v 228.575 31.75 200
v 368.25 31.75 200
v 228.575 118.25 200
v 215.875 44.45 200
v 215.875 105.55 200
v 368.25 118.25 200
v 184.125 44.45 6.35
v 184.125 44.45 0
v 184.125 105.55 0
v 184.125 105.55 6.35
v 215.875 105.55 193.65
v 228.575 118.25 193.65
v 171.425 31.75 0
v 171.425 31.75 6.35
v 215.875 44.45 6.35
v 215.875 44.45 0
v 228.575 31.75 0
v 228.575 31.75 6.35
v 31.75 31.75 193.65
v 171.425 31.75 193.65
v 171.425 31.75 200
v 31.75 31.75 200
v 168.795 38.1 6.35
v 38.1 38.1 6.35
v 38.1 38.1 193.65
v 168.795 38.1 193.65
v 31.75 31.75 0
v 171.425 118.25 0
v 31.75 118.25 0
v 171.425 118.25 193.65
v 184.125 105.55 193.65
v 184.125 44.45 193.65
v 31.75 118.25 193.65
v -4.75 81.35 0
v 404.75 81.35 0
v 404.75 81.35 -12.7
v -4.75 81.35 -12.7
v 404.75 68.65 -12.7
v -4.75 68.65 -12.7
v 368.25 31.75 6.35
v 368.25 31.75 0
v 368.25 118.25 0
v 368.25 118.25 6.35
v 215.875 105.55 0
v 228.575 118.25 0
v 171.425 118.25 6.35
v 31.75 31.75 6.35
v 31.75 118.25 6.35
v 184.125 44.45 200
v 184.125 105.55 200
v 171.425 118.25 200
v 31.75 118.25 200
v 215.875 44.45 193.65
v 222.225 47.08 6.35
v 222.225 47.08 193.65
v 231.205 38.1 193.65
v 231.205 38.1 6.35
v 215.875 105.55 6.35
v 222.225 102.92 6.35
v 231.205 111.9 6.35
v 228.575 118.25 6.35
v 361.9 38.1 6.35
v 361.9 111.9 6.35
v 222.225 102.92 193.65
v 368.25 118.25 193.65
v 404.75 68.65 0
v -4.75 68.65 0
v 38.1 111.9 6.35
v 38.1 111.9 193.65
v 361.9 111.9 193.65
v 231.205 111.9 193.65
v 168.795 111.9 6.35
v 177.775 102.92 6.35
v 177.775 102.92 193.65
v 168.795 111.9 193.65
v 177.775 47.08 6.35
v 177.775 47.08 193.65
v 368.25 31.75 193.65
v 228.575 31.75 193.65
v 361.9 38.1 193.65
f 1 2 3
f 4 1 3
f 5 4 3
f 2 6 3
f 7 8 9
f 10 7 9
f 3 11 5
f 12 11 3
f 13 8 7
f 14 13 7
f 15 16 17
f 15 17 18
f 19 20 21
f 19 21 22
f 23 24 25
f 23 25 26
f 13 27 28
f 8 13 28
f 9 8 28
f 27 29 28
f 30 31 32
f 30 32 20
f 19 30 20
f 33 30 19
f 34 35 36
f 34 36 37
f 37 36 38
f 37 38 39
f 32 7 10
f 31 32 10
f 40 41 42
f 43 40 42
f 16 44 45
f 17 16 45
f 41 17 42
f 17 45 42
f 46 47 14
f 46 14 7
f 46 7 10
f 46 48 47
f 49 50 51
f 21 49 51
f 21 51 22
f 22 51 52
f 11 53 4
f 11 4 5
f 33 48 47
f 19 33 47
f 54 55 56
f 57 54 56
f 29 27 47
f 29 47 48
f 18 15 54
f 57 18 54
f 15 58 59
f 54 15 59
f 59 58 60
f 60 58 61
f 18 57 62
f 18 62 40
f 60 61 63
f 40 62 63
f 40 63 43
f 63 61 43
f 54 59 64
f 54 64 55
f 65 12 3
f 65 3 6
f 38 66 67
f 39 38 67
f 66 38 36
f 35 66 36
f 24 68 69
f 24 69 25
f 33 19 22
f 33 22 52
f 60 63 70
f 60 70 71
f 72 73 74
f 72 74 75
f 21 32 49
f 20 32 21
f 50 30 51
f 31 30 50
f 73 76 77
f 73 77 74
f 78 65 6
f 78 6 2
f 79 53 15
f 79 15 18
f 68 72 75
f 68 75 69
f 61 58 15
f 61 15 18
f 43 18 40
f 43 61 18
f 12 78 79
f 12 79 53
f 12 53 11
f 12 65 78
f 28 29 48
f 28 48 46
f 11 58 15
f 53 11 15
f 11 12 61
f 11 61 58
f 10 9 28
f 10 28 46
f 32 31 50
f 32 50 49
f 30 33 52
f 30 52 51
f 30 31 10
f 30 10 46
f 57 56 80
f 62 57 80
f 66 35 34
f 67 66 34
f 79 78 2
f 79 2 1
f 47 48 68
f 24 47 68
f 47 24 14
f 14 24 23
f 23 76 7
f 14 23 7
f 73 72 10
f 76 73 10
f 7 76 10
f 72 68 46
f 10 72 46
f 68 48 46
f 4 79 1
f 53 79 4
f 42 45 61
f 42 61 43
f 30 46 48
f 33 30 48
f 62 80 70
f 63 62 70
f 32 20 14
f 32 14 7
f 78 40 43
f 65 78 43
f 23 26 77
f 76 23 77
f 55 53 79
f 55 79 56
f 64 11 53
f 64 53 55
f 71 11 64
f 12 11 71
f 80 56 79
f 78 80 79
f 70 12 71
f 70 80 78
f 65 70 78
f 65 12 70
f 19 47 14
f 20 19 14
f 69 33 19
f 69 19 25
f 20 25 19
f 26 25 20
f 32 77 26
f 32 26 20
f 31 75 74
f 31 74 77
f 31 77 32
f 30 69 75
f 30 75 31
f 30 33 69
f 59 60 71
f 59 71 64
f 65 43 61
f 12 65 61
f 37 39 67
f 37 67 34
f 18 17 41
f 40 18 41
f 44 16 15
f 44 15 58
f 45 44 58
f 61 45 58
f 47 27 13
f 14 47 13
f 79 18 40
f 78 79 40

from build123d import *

# Parameters (mm, degrees)
CROQUIS1_W                = 152.375
CROQUIS1_H                = 86.5
SALIENTE_EXTRUIR1_DEPTH   = 6.35
SALIENTE_EXTRUIR1_2_DEPTH = 6.35
CHAFL_N1_SIZE             = 12.7
CHAFL_N2_SIZE             = 12.7
SALIENTE_EXTRUIR2_DEPTH   = 187.3
SALIENTE_EXTRUIR2_2_DEPTH = 187.3
SALIENTE_EXTRUIR3_DEPTH   = 6.35
SALIENTE_EXTRUIR3_2_DEPTH = 6.35
CROQUIS4_W                = 409.5
CROQUIS4_H                = 12.7
SALIENTE_EXTRUIR4_DEPTH   = 12.7


with BuildPart() as part:
    # Croquis1 → Saliente-Extruir1 (new body)
    with BuildSketch(Plane.XY):
        with Locations((107.9375, 75)):
            Rectangle(CROQUIS1_W, CROQUIS1_H)
    extrude(amount=SALIENTE_EXTRUIR1_DEPTH)

    # Chaflán1
    chafl_n1_edges = [part.edges().sort_by_distance(p)[0] for p in [
        (184.125, 118.25, 3.175),
        (184.125, 31.75, 3.175),
    ]]
    chamfer(chafl_n1_edges, length=CHAFL_N1_SIZE)


with BuildPart() as body_2:
    # Croquis1 → Saliente-Extruir1 2 (new body)
    with BuildSketch(Plane.XY):
        with Locations((292.0625, 75)):
            Rectangle(CROQUIS1_W, CROQUIS1_H)
    extrude(amount=SALIENTE_EXTRUIR1_2_DEPTH)

    # Chaflán2
    chafl_n2_edges = [body_2.edges().sort_by_distance(p)[0] for p in [
        (215.875, 118.25, 3.175),
        (215.875, 31.75, 3.175),
    ]]
    chamfer(chafl_n2_edges, length=CHAFL_N2_SIZE)


with BuildPart() as body_3:
    # Croquis2 → Saliente-Extruir2 (new body)
    with BuildSketch(Plane.XY.offset(6.35)):
        Polygon((215.875, 105.55), (215.875, 44.45), (228.575, 31.75), (368.25, 31.75), (368.25, 118.25), (228.575, 118.25), align=None)
        Polygon((222.225, 102.919743879), (222.225, 47.080256121), (231.205256121, 38.1), (361.9, 38.1), (361.9, 111.9), (231.205256121, 111.9), align=None, mode=Mode.SUBTRACT)
    extrude(amount=SALIENTE_EXTRUIR2_DEPTH)


with BuildPart() as body_4:
    # Croquis2 → Saliente-Extruir2 2 (new body)
    with BuildSketch(Plane.XY.offset(6.35)):
        Polygon((31.75, 31.75), (171.425, 31.75), (184.125, 44.45), (184.125, 105.55), (171.425, 118.25), (31.75, 118.25), align=None)
        Polygon((168.794743879, 111.9), (38.1, 111.9), (38.1, 38.1), (168.794743879, 38.1), (177.775, 47.080256121), (177.775, 102.919743879), align=None, mode=Mode.SUBTRACT)
    extrude(amount=SALIENTE_EXTRUIR2_2_DEPTH)


with BuildPart() as body_5:
    # Croquis3 → Saliente-Extruir3 (new body)
    with BuildSketch(Plane.XY.offset(193.65)):
        Polygon((368.25, 31.75), (228.575, 31.75), (215.875, 44.45), (215.875, 105.55), (228.575, 118.25), (368.25, 118.25), align=None)
    extrude(amount=SALIENTE_EXTRUIR3_DEPTH)


with BuildPart() as body_6:
    # Croquis3 → Saliente-Extruir3 2 (new body)
    with BuildSketch(Plane.XY.offset(193.65)):
        Polygon((184.125, 105.55), (184.125, 44.45), (171.425, 31.75), (31.75, 31.75), (31.75, 118.25), (171.425, 118.25), align=None)
    extrude(amount=SALIENTE_EXTRUIR3_2_DEPTH)


with BuildPart() as body_7:
    # Croquis4 → Saliente-Extruir4 (new body)
    with BuildSketch(Plane(origin=(0, 0, 0), x_dir=(-1, 0, 0), z_dir=(0, 0, -1))):
        with Locations((-200, 75)):
            Rectangle(CROQUIS4_W, CROQUIS4_H)
    extrude(amount=SALIENTE_EXTRUIR4_DEPTH)


solid = Compound([part.part, body_2.part, body_3.part, body_4.part, body_5.part, body_6.part, body_7.part])
